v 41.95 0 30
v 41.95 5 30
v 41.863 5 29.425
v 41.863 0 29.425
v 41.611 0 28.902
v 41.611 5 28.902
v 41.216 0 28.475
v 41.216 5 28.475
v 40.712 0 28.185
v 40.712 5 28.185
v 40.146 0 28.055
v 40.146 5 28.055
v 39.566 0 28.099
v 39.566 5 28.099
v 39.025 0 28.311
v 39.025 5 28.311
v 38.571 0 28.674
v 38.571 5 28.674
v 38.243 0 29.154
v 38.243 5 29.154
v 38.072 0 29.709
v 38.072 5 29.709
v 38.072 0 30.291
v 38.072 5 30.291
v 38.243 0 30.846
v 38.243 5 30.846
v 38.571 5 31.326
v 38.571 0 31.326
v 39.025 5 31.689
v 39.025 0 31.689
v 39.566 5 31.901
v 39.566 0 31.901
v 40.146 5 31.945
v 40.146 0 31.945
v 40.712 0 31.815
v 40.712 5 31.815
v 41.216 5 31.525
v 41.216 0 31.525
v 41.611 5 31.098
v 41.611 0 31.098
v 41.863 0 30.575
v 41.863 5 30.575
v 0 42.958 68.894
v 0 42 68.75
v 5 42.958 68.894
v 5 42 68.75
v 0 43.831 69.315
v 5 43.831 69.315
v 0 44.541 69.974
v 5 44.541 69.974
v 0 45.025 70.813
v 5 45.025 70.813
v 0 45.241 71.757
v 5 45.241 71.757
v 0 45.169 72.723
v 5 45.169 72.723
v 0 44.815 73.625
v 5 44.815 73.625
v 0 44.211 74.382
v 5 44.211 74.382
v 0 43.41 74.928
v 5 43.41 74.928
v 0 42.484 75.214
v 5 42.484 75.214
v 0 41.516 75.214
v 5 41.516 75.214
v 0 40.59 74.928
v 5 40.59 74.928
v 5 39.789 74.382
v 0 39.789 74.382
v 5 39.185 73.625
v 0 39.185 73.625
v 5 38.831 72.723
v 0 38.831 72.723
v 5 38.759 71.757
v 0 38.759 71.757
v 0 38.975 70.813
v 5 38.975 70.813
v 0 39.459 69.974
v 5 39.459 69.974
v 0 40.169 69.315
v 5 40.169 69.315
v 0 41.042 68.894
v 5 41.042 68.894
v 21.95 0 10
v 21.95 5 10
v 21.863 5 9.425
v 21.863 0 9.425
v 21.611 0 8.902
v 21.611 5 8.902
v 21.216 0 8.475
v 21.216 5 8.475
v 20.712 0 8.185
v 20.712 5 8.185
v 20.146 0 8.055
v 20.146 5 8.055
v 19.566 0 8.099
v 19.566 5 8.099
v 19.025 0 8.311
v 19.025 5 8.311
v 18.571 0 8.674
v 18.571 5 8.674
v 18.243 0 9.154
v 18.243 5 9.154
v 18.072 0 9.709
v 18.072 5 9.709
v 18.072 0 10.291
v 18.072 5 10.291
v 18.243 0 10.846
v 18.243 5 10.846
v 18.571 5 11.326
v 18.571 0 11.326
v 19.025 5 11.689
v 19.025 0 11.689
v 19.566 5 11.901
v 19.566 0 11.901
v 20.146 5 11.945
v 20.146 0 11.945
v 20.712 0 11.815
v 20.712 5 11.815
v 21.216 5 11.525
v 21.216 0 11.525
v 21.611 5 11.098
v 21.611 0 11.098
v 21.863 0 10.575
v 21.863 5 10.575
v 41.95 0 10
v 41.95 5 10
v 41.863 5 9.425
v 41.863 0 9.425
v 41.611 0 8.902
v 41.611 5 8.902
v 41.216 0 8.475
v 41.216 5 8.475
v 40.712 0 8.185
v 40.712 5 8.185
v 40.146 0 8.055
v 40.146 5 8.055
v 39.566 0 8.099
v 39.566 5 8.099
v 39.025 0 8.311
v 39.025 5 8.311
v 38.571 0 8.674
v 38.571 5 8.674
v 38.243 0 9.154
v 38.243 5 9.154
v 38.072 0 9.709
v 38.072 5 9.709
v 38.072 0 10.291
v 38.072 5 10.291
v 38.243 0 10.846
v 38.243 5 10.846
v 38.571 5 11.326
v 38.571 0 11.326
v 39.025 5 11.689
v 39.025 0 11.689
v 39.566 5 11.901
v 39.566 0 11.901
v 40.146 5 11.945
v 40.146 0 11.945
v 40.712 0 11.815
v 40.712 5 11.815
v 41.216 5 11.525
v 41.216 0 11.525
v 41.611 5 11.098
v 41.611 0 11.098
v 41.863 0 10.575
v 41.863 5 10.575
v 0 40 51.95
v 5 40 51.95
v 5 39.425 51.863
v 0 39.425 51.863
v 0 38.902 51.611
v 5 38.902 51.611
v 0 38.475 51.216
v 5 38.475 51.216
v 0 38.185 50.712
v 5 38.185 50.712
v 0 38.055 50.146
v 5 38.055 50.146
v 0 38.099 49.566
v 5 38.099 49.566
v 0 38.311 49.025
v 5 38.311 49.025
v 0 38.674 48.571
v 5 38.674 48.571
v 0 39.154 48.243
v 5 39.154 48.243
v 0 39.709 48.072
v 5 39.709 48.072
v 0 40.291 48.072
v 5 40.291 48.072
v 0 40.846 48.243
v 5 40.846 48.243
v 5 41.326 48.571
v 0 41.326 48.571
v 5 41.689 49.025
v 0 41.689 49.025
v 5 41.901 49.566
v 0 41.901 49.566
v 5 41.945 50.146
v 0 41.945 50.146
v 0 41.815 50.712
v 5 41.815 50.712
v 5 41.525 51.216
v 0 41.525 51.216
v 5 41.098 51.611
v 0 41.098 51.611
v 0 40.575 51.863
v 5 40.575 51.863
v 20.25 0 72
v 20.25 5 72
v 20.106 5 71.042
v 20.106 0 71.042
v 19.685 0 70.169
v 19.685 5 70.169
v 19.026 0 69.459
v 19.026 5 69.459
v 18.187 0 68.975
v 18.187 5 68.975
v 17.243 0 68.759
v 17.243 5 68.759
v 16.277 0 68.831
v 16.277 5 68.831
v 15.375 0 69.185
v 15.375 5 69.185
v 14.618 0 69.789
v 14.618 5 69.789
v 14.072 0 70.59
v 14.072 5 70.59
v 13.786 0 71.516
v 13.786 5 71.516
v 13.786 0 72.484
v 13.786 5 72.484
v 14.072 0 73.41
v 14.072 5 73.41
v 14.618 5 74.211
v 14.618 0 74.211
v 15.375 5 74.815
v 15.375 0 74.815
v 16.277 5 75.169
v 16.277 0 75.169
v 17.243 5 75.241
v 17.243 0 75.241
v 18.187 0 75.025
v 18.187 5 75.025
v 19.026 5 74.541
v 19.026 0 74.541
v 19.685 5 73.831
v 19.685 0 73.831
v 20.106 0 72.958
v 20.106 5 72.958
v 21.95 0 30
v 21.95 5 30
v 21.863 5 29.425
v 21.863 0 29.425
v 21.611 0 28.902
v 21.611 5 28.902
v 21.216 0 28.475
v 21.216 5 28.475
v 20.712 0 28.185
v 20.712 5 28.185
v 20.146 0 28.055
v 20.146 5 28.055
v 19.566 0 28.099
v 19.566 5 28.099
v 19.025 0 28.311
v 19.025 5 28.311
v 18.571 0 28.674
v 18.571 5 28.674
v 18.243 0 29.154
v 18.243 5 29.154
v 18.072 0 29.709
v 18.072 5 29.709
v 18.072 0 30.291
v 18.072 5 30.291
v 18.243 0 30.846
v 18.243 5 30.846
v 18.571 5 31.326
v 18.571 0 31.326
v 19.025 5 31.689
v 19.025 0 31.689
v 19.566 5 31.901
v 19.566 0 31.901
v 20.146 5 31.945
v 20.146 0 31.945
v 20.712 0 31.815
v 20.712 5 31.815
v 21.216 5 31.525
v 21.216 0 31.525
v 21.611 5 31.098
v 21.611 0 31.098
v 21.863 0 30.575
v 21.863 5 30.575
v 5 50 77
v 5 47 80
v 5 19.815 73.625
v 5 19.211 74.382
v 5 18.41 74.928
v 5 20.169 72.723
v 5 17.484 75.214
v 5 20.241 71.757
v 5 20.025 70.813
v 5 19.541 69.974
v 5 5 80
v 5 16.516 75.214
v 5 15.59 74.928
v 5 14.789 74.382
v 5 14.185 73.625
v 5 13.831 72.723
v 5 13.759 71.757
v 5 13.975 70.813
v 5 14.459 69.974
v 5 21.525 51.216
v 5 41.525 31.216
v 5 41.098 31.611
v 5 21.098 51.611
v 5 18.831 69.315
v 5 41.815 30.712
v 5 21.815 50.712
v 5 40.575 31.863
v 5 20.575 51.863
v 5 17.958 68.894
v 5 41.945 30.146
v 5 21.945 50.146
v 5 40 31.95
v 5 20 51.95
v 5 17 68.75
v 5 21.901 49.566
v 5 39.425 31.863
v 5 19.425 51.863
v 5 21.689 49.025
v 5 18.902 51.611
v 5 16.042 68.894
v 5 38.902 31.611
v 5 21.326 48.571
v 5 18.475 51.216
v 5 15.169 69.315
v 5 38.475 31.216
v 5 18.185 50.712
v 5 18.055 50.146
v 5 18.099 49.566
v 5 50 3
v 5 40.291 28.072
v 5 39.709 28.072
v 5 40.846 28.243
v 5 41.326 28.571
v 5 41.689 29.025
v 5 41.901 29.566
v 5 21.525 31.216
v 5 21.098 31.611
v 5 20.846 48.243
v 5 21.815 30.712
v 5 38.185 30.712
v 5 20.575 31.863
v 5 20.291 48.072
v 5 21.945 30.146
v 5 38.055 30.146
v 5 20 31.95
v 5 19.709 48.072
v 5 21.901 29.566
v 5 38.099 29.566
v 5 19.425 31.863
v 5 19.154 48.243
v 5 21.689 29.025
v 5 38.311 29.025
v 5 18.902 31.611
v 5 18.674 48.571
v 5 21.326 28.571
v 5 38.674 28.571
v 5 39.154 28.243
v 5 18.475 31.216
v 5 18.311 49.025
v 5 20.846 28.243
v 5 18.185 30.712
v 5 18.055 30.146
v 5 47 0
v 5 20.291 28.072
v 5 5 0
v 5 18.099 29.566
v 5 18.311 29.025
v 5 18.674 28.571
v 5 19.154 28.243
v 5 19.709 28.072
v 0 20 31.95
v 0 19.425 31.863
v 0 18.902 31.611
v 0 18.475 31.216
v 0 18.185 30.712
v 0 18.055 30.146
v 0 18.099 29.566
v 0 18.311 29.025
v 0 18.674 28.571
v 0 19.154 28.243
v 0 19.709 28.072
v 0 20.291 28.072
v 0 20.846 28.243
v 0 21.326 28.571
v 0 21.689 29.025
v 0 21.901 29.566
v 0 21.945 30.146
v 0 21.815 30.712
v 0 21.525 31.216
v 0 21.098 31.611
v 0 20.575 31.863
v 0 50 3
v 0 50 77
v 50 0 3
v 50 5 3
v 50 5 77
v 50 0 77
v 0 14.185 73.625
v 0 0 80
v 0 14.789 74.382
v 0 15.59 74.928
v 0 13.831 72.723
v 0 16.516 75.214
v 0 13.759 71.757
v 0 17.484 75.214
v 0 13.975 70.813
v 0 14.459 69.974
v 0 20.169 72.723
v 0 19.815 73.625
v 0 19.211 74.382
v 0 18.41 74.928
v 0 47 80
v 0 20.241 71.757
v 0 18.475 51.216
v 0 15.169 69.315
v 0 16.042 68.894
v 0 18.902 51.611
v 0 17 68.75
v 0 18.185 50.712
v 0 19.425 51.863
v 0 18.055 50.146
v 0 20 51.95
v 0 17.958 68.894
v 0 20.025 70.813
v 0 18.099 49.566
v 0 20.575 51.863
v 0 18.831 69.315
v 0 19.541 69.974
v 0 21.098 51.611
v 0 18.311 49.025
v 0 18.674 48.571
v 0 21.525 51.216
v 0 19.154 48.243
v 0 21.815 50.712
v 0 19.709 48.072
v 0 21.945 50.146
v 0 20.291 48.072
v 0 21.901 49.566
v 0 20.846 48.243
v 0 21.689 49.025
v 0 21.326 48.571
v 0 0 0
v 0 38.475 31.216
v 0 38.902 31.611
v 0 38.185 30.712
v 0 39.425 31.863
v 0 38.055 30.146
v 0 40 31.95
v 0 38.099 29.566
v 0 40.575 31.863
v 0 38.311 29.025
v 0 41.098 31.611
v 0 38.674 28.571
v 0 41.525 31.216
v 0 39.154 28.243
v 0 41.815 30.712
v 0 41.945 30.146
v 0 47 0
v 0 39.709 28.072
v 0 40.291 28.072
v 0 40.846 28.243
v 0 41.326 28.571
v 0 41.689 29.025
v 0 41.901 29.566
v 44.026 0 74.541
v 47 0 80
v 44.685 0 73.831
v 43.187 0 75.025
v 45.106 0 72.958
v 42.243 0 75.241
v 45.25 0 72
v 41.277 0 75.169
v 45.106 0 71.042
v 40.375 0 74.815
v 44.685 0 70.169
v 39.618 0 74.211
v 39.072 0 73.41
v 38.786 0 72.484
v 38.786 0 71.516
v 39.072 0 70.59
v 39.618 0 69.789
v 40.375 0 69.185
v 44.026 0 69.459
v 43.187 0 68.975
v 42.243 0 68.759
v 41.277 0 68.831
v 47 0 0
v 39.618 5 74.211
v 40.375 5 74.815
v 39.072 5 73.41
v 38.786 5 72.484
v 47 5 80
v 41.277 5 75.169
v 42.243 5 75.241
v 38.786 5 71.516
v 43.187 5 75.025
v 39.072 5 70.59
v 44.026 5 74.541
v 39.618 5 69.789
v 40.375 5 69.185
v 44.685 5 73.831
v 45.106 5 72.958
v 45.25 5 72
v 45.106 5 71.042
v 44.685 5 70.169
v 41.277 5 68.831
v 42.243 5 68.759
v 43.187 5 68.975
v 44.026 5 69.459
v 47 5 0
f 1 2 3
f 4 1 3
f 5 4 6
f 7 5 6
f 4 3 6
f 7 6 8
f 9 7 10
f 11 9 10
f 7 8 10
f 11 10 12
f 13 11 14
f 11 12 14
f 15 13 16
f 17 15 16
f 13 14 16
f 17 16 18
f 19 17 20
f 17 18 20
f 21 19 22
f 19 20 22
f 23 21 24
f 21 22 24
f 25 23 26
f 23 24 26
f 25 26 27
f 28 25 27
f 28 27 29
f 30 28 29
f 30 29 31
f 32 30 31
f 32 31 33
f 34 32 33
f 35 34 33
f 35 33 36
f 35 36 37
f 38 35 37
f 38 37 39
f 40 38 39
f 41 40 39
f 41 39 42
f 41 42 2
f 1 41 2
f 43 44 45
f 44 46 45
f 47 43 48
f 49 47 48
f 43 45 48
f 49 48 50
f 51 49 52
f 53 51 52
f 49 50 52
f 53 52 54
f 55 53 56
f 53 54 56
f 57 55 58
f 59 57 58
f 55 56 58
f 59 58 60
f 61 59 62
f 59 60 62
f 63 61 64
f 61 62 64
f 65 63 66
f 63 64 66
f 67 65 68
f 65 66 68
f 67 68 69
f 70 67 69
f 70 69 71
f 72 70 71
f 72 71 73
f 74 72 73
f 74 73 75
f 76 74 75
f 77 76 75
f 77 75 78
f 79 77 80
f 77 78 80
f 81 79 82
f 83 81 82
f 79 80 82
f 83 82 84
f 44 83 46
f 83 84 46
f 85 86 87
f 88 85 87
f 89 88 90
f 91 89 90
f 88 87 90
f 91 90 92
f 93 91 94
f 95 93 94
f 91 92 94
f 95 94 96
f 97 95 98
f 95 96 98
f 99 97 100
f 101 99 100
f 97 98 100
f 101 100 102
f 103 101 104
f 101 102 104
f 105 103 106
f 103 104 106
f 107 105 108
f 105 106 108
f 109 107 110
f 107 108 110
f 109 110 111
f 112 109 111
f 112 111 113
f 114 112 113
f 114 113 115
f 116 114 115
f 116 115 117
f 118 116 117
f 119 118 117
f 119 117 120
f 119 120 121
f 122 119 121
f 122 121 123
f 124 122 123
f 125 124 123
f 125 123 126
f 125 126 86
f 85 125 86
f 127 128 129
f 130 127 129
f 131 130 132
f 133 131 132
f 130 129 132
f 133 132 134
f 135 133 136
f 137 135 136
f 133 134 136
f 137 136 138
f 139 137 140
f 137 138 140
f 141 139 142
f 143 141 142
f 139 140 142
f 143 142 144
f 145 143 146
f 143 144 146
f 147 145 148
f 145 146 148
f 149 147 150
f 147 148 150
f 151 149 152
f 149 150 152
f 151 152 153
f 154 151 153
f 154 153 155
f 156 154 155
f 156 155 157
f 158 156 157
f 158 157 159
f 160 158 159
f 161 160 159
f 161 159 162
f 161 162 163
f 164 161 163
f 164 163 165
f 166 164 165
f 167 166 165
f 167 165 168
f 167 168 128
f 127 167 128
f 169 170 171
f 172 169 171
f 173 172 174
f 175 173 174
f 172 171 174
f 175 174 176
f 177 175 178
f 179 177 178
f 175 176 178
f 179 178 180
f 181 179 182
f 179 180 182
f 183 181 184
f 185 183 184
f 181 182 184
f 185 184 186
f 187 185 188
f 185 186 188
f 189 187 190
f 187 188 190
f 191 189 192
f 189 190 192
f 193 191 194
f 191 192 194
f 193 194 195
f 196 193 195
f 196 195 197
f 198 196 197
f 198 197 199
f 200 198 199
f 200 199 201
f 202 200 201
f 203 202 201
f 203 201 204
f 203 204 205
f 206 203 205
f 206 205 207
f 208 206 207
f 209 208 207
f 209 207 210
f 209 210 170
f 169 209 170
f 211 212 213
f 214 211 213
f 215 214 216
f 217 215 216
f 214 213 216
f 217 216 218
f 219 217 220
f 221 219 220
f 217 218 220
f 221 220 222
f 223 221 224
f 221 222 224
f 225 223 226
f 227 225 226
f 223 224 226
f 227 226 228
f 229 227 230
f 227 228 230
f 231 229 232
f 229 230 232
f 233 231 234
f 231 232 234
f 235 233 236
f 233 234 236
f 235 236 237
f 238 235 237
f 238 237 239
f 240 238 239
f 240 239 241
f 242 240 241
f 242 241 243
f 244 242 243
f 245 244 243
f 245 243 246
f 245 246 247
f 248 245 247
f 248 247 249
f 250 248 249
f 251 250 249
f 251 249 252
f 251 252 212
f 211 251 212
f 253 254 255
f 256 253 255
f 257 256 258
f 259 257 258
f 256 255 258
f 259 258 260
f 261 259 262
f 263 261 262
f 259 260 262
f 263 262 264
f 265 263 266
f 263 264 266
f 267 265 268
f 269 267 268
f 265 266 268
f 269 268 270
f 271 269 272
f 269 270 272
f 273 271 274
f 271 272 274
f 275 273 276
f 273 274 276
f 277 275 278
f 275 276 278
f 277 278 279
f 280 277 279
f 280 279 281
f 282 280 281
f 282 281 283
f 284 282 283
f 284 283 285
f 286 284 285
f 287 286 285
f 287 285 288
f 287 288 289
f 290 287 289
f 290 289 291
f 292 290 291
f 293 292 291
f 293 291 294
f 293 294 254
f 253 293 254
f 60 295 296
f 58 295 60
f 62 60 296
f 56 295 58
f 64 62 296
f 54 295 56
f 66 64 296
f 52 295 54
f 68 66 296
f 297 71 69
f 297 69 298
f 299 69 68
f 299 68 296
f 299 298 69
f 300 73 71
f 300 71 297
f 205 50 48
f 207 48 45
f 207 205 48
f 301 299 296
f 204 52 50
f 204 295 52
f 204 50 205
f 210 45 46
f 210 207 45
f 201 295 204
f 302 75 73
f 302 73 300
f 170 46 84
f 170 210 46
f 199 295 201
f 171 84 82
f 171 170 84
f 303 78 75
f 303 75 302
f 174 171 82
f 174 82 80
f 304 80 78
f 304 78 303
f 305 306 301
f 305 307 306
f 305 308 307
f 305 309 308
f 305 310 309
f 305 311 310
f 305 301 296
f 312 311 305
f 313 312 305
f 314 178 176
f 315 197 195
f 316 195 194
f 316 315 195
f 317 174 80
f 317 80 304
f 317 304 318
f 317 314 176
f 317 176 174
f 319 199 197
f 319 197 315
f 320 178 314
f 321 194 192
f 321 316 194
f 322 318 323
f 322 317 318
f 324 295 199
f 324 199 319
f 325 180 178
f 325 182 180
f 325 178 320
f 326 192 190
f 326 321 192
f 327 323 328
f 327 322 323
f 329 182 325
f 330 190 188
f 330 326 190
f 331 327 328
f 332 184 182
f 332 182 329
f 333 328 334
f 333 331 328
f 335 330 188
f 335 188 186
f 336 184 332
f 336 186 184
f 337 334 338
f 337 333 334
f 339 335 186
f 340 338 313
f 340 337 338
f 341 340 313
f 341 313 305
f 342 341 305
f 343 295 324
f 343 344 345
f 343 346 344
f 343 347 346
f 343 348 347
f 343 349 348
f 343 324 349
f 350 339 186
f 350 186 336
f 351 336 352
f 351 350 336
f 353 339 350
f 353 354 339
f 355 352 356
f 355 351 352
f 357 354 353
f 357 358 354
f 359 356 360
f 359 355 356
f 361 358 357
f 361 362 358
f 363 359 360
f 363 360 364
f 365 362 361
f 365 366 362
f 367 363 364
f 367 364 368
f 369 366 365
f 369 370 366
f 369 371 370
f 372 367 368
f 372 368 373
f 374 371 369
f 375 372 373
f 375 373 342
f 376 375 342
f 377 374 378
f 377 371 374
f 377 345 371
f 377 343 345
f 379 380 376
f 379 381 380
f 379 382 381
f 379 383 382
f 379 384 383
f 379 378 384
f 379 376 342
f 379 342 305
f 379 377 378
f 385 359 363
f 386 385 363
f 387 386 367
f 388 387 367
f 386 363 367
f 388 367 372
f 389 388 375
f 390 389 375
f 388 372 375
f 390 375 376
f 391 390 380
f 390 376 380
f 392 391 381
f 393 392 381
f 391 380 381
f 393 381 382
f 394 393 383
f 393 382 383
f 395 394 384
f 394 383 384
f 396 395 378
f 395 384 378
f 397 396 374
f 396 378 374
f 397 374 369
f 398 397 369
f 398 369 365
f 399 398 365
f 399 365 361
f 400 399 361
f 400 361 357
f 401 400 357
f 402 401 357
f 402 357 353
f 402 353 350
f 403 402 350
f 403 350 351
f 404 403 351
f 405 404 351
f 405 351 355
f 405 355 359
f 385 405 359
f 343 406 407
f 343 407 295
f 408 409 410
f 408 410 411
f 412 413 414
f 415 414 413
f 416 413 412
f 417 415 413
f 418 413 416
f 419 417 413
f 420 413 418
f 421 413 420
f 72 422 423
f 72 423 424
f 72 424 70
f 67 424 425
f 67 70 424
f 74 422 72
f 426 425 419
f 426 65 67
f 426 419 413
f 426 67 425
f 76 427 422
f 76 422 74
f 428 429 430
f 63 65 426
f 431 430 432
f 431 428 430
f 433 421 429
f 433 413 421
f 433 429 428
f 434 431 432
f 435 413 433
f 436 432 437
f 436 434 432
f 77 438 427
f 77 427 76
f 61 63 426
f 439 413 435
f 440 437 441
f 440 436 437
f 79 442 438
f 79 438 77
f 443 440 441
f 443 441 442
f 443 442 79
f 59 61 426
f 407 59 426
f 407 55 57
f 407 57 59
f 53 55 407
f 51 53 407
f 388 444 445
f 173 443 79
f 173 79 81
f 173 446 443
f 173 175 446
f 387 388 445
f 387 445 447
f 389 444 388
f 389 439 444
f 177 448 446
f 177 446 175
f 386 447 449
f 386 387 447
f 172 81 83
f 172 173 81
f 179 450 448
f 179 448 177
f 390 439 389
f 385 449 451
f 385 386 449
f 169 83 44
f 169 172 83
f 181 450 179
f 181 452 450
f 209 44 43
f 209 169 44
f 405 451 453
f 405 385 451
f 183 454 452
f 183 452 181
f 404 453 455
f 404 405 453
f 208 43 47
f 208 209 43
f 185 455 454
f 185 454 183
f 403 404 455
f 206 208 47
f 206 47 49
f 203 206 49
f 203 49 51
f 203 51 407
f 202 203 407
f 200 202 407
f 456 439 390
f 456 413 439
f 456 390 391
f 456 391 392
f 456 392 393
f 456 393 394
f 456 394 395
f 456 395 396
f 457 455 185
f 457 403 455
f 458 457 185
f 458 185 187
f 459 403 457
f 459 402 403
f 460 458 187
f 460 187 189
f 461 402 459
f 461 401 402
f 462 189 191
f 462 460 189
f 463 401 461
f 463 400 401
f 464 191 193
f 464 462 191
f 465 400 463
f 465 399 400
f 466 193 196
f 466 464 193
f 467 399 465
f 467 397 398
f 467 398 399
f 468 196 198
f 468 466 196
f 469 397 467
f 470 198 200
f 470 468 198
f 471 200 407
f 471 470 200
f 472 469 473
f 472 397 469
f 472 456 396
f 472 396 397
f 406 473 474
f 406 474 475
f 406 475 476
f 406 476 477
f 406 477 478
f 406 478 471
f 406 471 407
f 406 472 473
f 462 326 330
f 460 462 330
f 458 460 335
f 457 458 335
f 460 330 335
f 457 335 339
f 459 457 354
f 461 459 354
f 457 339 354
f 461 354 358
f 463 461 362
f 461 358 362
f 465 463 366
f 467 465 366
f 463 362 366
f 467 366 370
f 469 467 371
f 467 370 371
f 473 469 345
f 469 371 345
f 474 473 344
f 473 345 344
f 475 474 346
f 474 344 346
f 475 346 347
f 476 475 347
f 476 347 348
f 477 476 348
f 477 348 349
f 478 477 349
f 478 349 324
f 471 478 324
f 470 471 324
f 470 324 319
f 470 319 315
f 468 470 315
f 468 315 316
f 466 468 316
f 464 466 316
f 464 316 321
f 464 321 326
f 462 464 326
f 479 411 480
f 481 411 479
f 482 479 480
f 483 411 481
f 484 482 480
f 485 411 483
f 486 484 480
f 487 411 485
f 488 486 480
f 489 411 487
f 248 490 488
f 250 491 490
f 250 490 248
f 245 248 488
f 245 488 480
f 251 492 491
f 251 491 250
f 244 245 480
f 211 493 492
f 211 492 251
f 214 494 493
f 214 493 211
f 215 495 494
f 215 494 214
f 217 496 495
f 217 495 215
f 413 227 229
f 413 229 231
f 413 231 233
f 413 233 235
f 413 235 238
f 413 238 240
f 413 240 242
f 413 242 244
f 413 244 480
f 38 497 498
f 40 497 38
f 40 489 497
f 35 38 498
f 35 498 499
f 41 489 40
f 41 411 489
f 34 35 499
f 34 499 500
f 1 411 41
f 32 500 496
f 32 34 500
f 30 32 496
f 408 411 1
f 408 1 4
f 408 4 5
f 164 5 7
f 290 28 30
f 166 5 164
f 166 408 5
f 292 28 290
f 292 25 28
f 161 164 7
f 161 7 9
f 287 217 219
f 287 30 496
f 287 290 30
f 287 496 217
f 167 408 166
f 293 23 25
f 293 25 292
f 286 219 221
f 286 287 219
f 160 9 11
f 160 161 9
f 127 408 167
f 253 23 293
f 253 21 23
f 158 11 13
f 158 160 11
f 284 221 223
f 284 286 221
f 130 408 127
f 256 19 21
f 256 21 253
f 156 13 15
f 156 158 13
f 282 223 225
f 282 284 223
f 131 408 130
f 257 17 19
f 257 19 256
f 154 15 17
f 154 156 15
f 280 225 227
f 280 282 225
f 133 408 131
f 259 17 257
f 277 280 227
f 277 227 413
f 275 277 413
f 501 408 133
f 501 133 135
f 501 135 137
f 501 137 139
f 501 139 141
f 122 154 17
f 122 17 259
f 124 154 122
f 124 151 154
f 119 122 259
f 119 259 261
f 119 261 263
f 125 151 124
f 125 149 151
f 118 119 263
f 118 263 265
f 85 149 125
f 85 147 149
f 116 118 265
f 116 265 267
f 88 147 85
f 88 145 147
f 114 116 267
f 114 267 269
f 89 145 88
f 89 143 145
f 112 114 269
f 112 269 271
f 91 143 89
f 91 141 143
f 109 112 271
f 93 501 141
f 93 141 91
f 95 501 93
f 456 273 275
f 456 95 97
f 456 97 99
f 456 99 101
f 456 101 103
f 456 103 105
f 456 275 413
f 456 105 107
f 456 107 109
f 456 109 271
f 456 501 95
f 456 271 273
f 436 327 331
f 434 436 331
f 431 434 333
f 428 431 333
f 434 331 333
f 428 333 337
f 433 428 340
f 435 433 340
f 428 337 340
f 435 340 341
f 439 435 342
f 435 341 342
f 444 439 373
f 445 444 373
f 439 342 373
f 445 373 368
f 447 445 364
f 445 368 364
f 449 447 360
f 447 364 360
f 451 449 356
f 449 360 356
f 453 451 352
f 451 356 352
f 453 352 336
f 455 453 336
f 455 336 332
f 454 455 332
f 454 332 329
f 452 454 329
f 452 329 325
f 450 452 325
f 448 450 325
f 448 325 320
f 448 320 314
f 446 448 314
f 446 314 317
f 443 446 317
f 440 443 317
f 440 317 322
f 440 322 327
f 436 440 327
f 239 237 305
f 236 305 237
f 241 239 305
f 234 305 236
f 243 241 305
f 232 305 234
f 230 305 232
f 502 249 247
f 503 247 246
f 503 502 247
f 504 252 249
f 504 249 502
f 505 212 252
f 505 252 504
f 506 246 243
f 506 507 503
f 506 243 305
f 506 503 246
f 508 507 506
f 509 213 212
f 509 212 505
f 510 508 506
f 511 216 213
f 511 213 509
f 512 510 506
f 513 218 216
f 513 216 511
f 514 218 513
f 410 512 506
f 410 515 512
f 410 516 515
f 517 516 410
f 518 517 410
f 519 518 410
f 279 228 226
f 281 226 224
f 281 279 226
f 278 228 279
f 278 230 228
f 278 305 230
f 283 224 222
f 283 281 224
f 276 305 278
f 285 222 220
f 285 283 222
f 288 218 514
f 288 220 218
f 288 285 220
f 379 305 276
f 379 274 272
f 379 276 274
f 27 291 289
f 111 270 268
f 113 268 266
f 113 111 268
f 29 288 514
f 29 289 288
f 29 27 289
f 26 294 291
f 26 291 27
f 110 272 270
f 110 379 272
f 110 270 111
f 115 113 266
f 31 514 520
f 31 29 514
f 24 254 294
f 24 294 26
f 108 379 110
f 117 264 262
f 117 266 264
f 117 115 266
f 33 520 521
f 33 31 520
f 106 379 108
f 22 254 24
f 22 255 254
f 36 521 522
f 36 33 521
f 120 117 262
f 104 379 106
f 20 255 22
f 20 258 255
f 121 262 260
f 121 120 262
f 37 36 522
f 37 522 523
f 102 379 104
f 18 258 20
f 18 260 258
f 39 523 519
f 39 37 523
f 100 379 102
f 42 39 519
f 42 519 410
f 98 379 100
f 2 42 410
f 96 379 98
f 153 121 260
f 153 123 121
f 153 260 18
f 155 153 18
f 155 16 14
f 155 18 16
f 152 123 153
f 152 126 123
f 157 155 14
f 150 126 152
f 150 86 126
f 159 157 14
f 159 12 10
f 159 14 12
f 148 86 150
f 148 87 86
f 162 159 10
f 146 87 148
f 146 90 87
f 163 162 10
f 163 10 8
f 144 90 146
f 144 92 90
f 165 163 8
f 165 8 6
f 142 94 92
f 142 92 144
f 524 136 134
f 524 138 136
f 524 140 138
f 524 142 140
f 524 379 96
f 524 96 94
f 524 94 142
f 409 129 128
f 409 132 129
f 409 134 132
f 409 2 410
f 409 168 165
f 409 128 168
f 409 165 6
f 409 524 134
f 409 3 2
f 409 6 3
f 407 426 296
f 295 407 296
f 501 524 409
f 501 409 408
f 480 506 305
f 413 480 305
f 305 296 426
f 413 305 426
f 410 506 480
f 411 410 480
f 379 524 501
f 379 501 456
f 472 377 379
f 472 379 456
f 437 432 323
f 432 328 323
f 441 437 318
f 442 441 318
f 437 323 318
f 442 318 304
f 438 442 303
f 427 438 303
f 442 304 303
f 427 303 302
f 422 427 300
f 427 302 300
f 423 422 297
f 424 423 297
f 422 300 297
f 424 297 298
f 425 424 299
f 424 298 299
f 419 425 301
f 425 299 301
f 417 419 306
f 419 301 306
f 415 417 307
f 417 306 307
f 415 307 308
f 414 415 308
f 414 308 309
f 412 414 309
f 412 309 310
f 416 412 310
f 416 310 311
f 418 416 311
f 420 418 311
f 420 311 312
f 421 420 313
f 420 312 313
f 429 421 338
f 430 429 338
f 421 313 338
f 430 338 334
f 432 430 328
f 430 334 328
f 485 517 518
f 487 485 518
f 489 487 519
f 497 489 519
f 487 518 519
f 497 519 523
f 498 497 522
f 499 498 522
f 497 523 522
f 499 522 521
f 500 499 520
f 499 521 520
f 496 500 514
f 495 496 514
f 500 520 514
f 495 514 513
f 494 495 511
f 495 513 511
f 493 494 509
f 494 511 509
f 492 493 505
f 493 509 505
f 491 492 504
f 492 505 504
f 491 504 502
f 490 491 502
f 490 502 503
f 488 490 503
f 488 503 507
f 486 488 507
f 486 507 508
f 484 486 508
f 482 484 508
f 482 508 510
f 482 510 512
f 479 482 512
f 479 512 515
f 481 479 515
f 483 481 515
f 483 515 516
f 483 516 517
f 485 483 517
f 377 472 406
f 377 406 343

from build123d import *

# Parameters (mm, degrees)
ESTRUSIONE_ESTRUSIONE1_DEPTH = 80
FORO_6_5_6_5_1_D             = 6.5
FORO_6_5_6_5_2_D             = 6.5
FORO_6_5_6_5_2_DEPTH         = 5
FORO_6_5_6_5_2_TIP           = 1.952797012
SMUSSO1_SIZE                 = 3
M3_5_CLEARANCE_HOLE1_D       = 3.9
M3_5_CLEARANCE_HOLE2_D       = 3.9


with BuildPart() as part:
    # Schizzo1 → Estrusione-Estrusione1 (new body)
    with BuildSketch(Plane.XY):
        Polygon((0, 0), (0, 50), (5, 50), (5, 5), (50, 5), (50, 0), align=None)
    extrude(amount=ESTRUSIONE_ESTRUSIONE1_DEPTH)

    # Foro Ø6.5 (6.5)-1 (through all)
    with Locations(Plane(origin=(0, 0, 0), x_dir=(-1, 0, 0), z_dir=(0, -1, 0))):
        with Locations((-17, -72), (-42, -72)):
            Hole(FORO_6_5_6_5_1_D / 2)

    # Foro Ø6.5 (6.5)-2
    with Locations(Plane.ZY):
        with Locations((72, 42), (72, 17)):
            Hole(FORO_6_5_6_5_2_D / 2, depth=FORO_6_5_6_5_2_DEPTH)
            with Locations((0, 0, -(FORO_6_5_6_5_2_DEPTH + FORO_6_5_6_5_2_TIP / 2))):  # 118° drill point
                Cone(0, FORO_6_5_6_5_2_D / 2, FORO_6_5_6_5_2_TIP, mode=Mode.SUBTRACT)

    # Smusso1
    smusso1_edges = [part.edges().sort_by_distance(p)[0] for p in [
        (2.5, 50, 80),
        (2.5, 50, 0),
        (50, 2.5, 80),
        (50, 2.5, 0),
    ]]
    chamfer(smusso1_edges, length=SMUSSO1_SIZE)

    # M3.5 Clearance Hole1 (through all)
    with Locations(Plane(origin=(20, 0, 30), x_dir=(-1, 0, 0), z_dir=(0, -1, 0))):
        with Locations((0, 0), (-20, 0), (-20, 20), (0, 20)):
            Hole(M3_5_CLEARANCE_HOLE1_D / 2)

    # M3.5 Clearance Hole2 (through all)
    with Locations(Plane(origin=(0, 40, 30), x_dir=(0, 0, -1), z_dir=(-1, 0, 0))):
        with Locations((0, 0), (-20, 0), (-20, 20), (0, 20)):
            Hole(M3_5_CLEARANCE_HOLE2_D / 2)


solid = part.part
